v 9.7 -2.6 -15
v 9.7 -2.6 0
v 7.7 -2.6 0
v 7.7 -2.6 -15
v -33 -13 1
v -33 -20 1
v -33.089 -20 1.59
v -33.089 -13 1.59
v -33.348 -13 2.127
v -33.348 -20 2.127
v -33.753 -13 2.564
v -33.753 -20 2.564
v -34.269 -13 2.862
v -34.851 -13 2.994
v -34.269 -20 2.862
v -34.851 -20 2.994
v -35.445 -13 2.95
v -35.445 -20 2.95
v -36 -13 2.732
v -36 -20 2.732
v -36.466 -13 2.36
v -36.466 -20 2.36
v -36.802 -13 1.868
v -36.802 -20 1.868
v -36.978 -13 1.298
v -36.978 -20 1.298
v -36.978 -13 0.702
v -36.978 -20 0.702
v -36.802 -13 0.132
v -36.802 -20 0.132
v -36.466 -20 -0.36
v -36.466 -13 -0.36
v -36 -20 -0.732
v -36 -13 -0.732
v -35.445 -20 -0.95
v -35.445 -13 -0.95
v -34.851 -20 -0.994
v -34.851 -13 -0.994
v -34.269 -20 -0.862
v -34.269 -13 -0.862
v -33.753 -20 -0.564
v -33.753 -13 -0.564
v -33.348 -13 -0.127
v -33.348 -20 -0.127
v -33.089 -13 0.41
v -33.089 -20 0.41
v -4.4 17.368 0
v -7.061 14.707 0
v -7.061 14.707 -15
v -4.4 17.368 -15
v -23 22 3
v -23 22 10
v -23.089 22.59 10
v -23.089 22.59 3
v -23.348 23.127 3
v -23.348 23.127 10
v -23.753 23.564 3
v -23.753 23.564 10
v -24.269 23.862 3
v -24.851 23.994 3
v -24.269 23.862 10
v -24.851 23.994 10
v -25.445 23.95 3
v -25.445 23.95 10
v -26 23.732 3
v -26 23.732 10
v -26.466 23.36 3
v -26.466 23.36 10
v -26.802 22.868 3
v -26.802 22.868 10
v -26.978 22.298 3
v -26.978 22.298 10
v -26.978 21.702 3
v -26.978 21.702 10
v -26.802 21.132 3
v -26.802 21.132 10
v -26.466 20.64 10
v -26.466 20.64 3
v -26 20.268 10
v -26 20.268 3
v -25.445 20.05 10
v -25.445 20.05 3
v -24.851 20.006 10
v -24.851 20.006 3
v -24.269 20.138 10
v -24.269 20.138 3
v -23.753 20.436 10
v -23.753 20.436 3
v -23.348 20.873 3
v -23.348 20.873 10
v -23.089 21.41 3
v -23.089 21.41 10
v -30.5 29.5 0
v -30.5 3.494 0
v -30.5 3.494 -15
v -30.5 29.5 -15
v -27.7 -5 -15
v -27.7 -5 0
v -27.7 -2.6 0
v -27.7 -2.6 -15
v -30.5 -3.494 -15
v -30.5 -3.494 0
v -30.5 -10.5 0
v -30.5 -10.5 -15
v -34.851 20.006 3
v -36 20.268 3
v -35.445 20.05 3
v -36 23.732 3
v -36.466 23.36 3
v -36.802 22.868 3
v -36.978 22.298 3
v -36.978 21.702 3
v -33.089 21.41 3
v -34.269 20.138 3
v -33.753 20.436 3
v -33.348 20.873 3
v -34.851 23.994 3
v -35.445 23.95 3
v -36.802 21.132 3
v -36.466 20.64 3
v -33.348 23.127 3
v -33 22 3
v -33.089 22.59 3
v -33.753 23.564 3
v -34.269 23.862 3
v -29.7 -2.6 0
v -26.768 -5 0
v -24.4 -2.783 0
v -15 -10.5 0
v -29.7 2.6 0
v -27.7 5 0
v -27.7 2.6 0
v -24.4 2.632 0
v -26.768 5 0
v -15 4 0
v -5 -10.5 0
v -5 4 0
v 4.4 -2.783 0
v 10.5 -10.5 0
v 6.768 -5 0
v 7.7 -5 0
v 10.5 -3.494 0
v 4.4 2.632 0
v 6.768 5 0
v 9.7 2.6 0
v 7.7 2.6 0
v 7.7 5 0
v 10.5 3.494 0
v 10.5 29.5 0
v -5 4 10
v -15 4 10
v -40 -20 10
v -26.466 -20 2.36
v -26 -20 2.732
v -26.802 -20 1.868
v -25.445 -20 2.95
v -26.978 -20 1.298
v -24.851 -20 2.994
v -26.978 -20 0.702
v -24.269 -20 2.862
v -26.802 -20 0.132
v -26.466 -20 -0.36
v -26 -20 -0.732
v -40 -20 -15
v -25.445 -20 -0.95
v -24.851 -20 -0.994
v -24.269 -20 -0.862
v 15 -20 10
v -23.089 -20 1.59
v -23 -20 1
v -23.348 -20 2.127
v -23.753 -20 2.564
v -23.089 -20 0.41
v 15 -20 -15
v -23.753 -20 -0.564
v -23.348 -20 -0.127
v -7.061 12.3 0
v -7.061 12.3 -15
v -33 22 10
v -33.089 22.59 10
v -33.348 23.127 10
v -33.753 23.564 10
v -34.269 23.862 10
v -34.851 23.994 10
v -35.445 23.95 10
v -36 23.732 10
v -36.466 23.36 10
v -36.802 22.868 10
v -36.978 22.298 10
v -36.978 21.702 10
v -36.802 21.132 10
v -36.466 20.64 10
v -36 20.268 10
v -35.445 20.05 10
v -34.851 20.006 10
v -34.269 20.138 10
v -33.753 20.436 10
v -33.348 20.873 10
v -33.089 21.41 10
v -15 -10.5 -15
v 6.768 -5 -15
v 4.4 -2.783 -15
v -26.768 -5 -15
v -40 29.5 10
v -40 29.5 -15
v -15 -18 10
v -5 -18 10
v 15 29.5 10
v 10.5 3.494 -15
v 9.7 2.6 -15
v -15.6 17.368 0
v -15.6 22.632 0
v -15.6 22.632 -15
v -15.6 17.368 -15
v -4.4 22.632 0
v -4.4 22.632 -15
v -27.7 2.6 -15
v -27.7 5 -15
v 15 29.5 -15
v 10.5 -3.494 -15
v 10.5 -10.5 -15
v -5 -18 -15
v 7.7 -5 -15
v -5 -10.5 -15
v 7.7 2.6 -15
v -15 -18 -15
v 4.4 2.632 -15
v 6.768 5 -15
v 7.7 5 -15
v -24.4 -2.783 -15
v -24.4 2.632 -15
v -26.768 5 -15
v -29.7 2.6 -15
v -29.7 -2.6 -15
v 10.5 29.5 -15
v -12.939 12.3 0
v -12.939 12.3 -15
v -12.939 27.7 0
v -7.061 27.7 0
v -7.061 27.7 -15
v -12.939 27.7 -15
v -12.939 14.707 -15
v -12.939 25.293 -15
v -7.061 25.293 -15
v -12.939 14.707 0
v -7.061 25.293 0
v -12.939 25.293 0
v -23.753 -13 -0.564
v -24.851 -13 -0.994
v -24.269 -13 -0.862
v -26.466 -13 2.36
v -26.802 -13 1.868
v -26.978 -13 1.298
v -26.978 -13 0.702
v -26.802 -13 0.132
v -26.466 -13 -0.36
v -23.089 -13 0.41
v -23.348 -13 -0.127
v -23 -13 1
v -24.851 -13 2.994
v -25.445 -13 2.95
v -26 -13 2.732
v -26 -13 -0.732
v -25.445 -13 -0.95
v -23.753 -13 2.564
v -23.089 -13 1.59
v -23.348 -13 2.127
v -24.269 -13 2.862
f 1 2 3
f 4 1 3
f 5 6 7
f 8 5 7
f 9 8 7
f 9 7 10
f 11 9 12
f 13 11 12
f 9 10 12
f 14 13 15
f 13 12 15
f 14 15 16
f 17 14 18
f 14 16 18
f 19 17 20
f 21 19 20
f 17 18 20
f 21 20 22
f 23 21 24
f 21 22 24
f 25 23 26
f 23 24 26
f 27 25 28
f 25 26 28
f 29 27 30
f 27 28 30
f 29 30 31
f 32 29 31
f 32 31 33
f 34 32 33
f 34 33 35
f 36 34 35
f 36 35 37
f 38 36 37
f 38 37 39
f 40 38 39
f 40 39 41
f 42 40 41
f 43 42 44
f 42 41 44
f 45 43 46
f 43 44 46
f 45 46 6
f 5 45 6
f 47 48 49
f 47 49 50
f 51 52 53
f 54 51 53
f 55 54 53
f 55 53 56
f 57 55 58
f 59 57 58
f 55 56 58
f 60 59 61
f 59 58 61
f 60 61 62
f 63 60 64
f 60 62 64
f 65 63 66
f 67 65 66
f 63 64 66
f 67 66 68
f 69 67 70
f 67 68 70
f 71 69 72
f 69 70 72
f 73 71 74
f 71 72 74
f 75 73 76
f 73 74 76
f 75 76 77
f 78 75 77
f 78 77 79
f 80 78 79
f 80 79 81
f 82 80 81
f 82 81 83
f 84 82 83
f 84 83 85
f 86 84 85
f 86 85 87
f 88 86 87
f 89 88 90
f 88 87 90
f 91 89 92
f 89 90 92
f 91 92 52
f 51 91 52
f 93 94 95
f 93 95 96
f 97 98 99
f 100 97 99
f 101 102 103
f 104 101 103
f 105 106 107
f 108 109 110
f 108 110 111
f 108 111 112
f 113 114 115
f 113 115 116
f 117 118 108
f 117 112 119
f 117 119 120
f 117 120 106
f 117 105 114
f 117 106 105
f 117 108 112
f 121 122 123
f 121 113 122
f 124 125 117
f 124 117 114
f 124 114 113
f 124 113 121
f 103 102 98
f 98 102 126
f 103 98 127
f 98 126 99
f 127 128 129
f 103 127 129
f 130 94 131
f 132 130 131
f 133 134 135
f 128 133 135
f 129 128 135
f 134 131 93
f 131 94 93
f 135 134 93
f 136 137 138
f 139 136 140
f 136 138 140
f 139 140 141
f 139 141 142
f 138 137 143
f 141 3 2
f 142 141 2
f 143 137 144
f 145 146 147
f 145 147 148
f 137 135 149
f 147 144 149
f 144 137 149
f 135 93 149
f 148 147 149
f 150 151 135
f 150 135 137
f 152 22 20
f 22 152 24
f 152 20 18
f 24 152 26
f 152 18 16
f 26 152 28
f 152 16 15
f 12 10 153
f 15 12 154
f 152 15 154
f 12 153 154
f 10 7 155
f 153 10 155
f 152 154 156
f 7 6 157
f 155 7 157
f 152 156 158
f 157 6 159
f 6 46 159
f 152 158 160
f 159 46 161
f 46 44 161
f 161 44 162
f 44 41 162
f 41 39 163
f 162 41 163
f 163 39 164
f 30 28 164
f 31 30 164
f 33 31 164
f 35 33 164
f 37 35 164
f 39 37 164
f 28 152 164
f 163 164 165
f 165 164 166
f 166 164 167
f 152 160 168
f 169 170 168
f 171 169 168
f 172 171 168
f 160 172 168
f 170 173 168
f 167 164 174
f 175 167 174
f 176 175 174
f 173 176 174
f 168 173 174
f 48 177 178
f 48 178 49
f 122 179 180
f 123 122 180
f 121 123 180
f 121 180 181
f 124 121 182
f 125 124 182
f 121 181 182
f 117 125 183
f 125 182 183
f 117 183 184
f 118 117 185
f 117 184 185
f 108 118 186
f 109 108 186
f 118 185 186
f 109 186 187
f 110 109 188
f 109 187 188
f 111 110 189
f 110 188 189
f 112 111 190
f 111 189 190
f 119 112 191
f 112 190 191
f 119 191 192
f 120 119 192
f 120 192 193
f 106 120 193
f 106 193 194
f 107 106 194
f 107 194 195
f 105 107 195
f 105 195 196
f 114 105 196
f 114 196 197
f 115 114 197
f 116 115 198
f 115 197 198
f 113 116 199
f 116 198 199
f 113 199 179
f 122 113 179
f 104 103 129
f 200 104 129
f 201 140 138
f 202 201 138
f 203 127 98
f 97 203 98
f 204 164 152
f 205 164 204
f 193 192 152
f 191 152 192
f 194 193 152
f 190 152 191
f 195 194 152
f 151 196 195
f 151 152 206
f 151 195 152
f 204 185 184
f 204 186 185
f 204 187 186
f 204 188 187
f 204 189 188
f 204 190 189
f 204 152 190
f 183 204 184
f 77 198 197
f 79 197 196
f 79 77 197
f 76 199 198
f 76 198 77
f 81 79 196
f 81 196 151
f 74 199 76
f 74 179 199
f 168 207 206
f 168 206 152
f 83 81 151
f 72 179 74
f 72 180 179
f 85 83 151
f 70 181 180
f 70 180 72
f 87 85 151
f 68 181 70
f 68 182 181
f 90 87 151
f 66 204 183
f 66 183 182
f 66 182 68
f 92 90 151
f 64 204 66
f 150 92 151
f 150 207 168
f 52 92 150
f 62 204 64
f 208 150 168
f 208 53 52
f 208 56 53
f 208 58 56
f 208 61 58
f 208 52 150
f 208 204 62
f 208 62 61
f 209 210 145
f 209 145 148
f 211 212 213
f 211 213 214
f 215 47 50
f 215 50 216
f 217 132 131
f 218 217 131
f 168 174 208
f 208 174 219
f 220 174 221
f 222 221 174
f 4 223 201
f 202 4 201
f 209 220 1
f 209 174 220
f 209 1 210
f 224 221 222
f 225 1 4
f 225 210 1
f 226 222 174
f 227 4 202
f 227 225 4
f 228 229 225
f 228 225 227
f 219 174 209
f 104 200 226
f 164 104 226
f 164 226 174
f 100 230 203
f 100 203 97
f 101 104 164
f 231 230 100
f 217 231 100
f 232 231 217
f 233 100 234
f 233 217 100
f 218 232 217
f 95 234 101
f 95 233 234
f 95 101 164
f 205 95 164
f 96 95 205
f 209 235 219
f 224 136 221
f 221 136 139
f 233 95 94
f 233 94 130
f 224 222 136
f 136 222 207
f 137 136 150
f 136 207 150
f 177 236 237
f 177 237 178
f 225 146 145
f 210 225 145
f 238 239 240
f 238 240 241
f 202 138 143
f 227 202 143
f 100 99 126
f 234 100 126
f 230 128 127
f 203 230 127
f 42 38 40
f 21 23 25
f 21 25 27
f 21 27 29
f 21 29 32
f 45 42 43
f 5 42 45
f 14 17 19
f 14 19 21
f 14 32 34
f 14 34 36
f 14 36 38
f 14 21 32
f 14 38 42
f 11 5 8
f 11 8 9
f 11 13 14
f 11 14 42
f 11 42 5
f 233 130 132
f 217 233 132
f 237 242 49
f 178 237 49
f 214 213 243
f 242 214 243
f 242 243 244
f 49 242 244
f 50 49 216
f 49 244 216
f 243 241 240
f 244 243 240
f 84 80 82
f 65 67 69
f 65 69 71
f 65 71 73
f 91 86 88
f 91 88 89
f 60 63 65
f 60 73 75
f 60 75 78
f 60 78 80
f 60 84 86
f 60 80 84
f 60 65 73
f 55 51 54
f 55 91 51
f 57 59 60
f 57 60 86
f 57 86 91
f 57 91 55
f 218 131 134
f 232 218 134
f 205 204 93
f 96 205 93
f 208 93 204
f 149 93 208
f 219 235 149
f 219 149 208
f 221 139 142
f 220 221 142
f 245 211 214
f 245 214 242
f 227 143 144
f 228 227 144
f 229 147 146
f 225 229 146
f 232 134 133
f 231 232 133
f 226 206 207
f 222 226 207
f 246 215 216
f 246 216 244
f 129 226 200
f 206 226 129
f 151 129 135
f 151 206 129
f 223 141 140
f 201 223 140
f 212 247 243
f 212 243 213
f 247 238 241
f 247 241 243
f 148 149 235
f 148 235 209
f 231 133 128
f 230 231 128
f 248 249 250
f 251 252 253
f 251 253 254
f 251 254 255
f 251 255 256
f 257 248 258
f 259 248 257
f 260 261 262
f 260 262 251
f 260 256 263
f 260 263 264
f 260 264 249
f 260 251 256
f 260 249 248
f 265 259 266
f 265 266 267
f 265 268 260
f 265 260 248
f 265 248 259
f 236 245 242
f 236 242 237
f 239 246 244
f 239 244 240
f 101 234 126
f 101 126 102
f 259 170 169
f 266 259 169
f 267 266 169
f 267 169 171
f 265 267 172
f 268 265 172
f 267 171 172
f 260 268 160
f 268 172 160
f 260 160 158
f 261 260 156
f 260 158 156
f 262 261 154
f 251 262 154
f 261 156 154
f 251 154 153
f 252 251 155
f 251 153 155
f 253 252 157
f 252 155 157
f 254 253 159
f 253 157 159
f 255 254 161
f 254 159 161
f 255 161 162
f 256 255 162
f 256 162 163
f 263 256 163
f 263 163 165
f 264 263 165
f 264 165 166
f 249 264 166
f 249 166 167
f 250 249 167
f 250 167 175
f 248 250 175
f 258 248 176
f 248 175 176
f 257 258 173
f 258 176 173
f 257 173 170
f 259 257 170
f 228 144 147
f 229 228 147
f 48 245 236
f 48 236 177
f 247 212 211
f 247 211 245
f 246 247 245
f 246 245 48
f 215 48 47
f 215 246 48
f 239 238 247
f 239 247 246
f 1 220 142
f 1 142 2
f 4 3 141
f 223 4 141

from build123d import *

# Parameters (mm, degrees)
BOSS_EXTRUDE1_DEPTH = 15
SKETCH3_W           = 55
SKETCH3_H           = 49.5
BOSS_EXTRUDE2_DEPTH = 10
BOSS_EXTRUDE3_DEPTH = 15
SKETCH5_R           = 2
CUT_EXTRUDE1_DEPTH  = 7
SKETCH6_R           = 2
CUT_EXTRUDE2_DEPTH  = 7
SKETCH7_W           = 10
SKETCH7_H           = 22
CUT_EXTRUDE3_DEPTH  = 43


with BuildPart() as part:
    # Sketch1 → Boss-Extrude1 (new body)
    with BuildSketch(Plane.XY):
        Polygon((15, -20), (-40, -20), (-40, 29.5), (-30.5, 29.5), (-30.5, 10), (-30.5, 3.494427191), (-29.7, 2.6), (-27.7, 2.6), (-27.7, 5), (-26.767766953, 5), (-24.4, 2.632233047), (-24.4, -2.783060843), (-26.767766953, -5), (-27.7, -5), (-27.7, -2.6), (-29.7, -2.6), (-30.5, -3.494427191), (-30.5, -10.5), (10.5, -10.5), (10.5, -3.494427191), (9.7, -2.6), (7.7, -2.6), (7.7, -5), (6.767766953, -5), (4.4, -2.783060843), (4.4, 2.632233047), (6.767766953, 5), (7.7, 5), (7.7, 2.6), (9.7, 2.6), (10.5, 3.494427191), (10.5, 10), (10.5, 29.5), (15, 29.5), align=None)
    extrude(amount=-BOSS_EXTRUDE1_DEPTH)

    # Sketch3 → Boss-Extrude2 (add)
    with BuildSketch(Plane.XY):
        with Locations((-12.5, 4.75)):
            Rectangle(SKETCH3_W, SKETCH3_H)
    extrude(amount=BOSS_EXTRUDE2_DEPTH)

    # Sketch5 → Cut-Extrude1 (cut)
    with BuildSketch(Plane.XY.offset(10)):
        with Locations((-35, 22)):
            Circle(SKETCH5_R)
        with Locations((-25, 22)):
            Circle(SKETCH5_R)
    extrude(amount=-CUT_EXTRUDE1_DEPTH, mode=Mode.SUBTRACT)

    # Sketch6 → Cut-Extrude2 (cut)
    with BuildSketch(Plane(origin=(0, -20, 0), x_dir=(-1, 0, 0), z_dir=(0, -1, 0))):
        with Locations(Location((35, -1, 0), (0, 0, 180))):
            Circle(SKETCH6_R)
        with Locations(Location((25, -1, 0), (0, 0, 180))):
            Circle(SKETCH6_R)
    extrude(amount=-CUT_EXTRUDE2_DEPTH, mode=Mode.SUBTRACT)

    # Sketch7 → Cut-Extrude3 (cut)
    with BuildSketch(Plane.XY.offset(10)):
        with Locations((-10, -7)):
            Rectangle(SKETCH7_W, SKETCH7_H)
    extrude(amount=-CUT_EXTRUDE3_DEPTH, mode=Mode.SUBTRACT)


with BuildPart() as body_2:
    # Sketch4 → Boss-Extrude3 (new body)
    with BuildSketch(Plane(origin=(0, 0, 0), x_dir=(-1, 0, 0), z_dir=(0, 0, -1))):
        Polygon((12.939339828, 25.292893219), (15.6, 22.632233047), (15.6, 17.367766953), (12.939339828, 14.707106781), (12.939339828, 12.3), (7.060660172, 12.3), (7.060660172, 14.707106781), (4.4, 17.367766953), (4.4, 22.632233047), (7.060660172, 25.292893219), (7.060660172, 27.7), (12.939339828, 27.7), align=None)
    extrude(amount=BOSS_EXTRUDE3_DEPTH)


solid = Compound([part.part, body_2.part])
